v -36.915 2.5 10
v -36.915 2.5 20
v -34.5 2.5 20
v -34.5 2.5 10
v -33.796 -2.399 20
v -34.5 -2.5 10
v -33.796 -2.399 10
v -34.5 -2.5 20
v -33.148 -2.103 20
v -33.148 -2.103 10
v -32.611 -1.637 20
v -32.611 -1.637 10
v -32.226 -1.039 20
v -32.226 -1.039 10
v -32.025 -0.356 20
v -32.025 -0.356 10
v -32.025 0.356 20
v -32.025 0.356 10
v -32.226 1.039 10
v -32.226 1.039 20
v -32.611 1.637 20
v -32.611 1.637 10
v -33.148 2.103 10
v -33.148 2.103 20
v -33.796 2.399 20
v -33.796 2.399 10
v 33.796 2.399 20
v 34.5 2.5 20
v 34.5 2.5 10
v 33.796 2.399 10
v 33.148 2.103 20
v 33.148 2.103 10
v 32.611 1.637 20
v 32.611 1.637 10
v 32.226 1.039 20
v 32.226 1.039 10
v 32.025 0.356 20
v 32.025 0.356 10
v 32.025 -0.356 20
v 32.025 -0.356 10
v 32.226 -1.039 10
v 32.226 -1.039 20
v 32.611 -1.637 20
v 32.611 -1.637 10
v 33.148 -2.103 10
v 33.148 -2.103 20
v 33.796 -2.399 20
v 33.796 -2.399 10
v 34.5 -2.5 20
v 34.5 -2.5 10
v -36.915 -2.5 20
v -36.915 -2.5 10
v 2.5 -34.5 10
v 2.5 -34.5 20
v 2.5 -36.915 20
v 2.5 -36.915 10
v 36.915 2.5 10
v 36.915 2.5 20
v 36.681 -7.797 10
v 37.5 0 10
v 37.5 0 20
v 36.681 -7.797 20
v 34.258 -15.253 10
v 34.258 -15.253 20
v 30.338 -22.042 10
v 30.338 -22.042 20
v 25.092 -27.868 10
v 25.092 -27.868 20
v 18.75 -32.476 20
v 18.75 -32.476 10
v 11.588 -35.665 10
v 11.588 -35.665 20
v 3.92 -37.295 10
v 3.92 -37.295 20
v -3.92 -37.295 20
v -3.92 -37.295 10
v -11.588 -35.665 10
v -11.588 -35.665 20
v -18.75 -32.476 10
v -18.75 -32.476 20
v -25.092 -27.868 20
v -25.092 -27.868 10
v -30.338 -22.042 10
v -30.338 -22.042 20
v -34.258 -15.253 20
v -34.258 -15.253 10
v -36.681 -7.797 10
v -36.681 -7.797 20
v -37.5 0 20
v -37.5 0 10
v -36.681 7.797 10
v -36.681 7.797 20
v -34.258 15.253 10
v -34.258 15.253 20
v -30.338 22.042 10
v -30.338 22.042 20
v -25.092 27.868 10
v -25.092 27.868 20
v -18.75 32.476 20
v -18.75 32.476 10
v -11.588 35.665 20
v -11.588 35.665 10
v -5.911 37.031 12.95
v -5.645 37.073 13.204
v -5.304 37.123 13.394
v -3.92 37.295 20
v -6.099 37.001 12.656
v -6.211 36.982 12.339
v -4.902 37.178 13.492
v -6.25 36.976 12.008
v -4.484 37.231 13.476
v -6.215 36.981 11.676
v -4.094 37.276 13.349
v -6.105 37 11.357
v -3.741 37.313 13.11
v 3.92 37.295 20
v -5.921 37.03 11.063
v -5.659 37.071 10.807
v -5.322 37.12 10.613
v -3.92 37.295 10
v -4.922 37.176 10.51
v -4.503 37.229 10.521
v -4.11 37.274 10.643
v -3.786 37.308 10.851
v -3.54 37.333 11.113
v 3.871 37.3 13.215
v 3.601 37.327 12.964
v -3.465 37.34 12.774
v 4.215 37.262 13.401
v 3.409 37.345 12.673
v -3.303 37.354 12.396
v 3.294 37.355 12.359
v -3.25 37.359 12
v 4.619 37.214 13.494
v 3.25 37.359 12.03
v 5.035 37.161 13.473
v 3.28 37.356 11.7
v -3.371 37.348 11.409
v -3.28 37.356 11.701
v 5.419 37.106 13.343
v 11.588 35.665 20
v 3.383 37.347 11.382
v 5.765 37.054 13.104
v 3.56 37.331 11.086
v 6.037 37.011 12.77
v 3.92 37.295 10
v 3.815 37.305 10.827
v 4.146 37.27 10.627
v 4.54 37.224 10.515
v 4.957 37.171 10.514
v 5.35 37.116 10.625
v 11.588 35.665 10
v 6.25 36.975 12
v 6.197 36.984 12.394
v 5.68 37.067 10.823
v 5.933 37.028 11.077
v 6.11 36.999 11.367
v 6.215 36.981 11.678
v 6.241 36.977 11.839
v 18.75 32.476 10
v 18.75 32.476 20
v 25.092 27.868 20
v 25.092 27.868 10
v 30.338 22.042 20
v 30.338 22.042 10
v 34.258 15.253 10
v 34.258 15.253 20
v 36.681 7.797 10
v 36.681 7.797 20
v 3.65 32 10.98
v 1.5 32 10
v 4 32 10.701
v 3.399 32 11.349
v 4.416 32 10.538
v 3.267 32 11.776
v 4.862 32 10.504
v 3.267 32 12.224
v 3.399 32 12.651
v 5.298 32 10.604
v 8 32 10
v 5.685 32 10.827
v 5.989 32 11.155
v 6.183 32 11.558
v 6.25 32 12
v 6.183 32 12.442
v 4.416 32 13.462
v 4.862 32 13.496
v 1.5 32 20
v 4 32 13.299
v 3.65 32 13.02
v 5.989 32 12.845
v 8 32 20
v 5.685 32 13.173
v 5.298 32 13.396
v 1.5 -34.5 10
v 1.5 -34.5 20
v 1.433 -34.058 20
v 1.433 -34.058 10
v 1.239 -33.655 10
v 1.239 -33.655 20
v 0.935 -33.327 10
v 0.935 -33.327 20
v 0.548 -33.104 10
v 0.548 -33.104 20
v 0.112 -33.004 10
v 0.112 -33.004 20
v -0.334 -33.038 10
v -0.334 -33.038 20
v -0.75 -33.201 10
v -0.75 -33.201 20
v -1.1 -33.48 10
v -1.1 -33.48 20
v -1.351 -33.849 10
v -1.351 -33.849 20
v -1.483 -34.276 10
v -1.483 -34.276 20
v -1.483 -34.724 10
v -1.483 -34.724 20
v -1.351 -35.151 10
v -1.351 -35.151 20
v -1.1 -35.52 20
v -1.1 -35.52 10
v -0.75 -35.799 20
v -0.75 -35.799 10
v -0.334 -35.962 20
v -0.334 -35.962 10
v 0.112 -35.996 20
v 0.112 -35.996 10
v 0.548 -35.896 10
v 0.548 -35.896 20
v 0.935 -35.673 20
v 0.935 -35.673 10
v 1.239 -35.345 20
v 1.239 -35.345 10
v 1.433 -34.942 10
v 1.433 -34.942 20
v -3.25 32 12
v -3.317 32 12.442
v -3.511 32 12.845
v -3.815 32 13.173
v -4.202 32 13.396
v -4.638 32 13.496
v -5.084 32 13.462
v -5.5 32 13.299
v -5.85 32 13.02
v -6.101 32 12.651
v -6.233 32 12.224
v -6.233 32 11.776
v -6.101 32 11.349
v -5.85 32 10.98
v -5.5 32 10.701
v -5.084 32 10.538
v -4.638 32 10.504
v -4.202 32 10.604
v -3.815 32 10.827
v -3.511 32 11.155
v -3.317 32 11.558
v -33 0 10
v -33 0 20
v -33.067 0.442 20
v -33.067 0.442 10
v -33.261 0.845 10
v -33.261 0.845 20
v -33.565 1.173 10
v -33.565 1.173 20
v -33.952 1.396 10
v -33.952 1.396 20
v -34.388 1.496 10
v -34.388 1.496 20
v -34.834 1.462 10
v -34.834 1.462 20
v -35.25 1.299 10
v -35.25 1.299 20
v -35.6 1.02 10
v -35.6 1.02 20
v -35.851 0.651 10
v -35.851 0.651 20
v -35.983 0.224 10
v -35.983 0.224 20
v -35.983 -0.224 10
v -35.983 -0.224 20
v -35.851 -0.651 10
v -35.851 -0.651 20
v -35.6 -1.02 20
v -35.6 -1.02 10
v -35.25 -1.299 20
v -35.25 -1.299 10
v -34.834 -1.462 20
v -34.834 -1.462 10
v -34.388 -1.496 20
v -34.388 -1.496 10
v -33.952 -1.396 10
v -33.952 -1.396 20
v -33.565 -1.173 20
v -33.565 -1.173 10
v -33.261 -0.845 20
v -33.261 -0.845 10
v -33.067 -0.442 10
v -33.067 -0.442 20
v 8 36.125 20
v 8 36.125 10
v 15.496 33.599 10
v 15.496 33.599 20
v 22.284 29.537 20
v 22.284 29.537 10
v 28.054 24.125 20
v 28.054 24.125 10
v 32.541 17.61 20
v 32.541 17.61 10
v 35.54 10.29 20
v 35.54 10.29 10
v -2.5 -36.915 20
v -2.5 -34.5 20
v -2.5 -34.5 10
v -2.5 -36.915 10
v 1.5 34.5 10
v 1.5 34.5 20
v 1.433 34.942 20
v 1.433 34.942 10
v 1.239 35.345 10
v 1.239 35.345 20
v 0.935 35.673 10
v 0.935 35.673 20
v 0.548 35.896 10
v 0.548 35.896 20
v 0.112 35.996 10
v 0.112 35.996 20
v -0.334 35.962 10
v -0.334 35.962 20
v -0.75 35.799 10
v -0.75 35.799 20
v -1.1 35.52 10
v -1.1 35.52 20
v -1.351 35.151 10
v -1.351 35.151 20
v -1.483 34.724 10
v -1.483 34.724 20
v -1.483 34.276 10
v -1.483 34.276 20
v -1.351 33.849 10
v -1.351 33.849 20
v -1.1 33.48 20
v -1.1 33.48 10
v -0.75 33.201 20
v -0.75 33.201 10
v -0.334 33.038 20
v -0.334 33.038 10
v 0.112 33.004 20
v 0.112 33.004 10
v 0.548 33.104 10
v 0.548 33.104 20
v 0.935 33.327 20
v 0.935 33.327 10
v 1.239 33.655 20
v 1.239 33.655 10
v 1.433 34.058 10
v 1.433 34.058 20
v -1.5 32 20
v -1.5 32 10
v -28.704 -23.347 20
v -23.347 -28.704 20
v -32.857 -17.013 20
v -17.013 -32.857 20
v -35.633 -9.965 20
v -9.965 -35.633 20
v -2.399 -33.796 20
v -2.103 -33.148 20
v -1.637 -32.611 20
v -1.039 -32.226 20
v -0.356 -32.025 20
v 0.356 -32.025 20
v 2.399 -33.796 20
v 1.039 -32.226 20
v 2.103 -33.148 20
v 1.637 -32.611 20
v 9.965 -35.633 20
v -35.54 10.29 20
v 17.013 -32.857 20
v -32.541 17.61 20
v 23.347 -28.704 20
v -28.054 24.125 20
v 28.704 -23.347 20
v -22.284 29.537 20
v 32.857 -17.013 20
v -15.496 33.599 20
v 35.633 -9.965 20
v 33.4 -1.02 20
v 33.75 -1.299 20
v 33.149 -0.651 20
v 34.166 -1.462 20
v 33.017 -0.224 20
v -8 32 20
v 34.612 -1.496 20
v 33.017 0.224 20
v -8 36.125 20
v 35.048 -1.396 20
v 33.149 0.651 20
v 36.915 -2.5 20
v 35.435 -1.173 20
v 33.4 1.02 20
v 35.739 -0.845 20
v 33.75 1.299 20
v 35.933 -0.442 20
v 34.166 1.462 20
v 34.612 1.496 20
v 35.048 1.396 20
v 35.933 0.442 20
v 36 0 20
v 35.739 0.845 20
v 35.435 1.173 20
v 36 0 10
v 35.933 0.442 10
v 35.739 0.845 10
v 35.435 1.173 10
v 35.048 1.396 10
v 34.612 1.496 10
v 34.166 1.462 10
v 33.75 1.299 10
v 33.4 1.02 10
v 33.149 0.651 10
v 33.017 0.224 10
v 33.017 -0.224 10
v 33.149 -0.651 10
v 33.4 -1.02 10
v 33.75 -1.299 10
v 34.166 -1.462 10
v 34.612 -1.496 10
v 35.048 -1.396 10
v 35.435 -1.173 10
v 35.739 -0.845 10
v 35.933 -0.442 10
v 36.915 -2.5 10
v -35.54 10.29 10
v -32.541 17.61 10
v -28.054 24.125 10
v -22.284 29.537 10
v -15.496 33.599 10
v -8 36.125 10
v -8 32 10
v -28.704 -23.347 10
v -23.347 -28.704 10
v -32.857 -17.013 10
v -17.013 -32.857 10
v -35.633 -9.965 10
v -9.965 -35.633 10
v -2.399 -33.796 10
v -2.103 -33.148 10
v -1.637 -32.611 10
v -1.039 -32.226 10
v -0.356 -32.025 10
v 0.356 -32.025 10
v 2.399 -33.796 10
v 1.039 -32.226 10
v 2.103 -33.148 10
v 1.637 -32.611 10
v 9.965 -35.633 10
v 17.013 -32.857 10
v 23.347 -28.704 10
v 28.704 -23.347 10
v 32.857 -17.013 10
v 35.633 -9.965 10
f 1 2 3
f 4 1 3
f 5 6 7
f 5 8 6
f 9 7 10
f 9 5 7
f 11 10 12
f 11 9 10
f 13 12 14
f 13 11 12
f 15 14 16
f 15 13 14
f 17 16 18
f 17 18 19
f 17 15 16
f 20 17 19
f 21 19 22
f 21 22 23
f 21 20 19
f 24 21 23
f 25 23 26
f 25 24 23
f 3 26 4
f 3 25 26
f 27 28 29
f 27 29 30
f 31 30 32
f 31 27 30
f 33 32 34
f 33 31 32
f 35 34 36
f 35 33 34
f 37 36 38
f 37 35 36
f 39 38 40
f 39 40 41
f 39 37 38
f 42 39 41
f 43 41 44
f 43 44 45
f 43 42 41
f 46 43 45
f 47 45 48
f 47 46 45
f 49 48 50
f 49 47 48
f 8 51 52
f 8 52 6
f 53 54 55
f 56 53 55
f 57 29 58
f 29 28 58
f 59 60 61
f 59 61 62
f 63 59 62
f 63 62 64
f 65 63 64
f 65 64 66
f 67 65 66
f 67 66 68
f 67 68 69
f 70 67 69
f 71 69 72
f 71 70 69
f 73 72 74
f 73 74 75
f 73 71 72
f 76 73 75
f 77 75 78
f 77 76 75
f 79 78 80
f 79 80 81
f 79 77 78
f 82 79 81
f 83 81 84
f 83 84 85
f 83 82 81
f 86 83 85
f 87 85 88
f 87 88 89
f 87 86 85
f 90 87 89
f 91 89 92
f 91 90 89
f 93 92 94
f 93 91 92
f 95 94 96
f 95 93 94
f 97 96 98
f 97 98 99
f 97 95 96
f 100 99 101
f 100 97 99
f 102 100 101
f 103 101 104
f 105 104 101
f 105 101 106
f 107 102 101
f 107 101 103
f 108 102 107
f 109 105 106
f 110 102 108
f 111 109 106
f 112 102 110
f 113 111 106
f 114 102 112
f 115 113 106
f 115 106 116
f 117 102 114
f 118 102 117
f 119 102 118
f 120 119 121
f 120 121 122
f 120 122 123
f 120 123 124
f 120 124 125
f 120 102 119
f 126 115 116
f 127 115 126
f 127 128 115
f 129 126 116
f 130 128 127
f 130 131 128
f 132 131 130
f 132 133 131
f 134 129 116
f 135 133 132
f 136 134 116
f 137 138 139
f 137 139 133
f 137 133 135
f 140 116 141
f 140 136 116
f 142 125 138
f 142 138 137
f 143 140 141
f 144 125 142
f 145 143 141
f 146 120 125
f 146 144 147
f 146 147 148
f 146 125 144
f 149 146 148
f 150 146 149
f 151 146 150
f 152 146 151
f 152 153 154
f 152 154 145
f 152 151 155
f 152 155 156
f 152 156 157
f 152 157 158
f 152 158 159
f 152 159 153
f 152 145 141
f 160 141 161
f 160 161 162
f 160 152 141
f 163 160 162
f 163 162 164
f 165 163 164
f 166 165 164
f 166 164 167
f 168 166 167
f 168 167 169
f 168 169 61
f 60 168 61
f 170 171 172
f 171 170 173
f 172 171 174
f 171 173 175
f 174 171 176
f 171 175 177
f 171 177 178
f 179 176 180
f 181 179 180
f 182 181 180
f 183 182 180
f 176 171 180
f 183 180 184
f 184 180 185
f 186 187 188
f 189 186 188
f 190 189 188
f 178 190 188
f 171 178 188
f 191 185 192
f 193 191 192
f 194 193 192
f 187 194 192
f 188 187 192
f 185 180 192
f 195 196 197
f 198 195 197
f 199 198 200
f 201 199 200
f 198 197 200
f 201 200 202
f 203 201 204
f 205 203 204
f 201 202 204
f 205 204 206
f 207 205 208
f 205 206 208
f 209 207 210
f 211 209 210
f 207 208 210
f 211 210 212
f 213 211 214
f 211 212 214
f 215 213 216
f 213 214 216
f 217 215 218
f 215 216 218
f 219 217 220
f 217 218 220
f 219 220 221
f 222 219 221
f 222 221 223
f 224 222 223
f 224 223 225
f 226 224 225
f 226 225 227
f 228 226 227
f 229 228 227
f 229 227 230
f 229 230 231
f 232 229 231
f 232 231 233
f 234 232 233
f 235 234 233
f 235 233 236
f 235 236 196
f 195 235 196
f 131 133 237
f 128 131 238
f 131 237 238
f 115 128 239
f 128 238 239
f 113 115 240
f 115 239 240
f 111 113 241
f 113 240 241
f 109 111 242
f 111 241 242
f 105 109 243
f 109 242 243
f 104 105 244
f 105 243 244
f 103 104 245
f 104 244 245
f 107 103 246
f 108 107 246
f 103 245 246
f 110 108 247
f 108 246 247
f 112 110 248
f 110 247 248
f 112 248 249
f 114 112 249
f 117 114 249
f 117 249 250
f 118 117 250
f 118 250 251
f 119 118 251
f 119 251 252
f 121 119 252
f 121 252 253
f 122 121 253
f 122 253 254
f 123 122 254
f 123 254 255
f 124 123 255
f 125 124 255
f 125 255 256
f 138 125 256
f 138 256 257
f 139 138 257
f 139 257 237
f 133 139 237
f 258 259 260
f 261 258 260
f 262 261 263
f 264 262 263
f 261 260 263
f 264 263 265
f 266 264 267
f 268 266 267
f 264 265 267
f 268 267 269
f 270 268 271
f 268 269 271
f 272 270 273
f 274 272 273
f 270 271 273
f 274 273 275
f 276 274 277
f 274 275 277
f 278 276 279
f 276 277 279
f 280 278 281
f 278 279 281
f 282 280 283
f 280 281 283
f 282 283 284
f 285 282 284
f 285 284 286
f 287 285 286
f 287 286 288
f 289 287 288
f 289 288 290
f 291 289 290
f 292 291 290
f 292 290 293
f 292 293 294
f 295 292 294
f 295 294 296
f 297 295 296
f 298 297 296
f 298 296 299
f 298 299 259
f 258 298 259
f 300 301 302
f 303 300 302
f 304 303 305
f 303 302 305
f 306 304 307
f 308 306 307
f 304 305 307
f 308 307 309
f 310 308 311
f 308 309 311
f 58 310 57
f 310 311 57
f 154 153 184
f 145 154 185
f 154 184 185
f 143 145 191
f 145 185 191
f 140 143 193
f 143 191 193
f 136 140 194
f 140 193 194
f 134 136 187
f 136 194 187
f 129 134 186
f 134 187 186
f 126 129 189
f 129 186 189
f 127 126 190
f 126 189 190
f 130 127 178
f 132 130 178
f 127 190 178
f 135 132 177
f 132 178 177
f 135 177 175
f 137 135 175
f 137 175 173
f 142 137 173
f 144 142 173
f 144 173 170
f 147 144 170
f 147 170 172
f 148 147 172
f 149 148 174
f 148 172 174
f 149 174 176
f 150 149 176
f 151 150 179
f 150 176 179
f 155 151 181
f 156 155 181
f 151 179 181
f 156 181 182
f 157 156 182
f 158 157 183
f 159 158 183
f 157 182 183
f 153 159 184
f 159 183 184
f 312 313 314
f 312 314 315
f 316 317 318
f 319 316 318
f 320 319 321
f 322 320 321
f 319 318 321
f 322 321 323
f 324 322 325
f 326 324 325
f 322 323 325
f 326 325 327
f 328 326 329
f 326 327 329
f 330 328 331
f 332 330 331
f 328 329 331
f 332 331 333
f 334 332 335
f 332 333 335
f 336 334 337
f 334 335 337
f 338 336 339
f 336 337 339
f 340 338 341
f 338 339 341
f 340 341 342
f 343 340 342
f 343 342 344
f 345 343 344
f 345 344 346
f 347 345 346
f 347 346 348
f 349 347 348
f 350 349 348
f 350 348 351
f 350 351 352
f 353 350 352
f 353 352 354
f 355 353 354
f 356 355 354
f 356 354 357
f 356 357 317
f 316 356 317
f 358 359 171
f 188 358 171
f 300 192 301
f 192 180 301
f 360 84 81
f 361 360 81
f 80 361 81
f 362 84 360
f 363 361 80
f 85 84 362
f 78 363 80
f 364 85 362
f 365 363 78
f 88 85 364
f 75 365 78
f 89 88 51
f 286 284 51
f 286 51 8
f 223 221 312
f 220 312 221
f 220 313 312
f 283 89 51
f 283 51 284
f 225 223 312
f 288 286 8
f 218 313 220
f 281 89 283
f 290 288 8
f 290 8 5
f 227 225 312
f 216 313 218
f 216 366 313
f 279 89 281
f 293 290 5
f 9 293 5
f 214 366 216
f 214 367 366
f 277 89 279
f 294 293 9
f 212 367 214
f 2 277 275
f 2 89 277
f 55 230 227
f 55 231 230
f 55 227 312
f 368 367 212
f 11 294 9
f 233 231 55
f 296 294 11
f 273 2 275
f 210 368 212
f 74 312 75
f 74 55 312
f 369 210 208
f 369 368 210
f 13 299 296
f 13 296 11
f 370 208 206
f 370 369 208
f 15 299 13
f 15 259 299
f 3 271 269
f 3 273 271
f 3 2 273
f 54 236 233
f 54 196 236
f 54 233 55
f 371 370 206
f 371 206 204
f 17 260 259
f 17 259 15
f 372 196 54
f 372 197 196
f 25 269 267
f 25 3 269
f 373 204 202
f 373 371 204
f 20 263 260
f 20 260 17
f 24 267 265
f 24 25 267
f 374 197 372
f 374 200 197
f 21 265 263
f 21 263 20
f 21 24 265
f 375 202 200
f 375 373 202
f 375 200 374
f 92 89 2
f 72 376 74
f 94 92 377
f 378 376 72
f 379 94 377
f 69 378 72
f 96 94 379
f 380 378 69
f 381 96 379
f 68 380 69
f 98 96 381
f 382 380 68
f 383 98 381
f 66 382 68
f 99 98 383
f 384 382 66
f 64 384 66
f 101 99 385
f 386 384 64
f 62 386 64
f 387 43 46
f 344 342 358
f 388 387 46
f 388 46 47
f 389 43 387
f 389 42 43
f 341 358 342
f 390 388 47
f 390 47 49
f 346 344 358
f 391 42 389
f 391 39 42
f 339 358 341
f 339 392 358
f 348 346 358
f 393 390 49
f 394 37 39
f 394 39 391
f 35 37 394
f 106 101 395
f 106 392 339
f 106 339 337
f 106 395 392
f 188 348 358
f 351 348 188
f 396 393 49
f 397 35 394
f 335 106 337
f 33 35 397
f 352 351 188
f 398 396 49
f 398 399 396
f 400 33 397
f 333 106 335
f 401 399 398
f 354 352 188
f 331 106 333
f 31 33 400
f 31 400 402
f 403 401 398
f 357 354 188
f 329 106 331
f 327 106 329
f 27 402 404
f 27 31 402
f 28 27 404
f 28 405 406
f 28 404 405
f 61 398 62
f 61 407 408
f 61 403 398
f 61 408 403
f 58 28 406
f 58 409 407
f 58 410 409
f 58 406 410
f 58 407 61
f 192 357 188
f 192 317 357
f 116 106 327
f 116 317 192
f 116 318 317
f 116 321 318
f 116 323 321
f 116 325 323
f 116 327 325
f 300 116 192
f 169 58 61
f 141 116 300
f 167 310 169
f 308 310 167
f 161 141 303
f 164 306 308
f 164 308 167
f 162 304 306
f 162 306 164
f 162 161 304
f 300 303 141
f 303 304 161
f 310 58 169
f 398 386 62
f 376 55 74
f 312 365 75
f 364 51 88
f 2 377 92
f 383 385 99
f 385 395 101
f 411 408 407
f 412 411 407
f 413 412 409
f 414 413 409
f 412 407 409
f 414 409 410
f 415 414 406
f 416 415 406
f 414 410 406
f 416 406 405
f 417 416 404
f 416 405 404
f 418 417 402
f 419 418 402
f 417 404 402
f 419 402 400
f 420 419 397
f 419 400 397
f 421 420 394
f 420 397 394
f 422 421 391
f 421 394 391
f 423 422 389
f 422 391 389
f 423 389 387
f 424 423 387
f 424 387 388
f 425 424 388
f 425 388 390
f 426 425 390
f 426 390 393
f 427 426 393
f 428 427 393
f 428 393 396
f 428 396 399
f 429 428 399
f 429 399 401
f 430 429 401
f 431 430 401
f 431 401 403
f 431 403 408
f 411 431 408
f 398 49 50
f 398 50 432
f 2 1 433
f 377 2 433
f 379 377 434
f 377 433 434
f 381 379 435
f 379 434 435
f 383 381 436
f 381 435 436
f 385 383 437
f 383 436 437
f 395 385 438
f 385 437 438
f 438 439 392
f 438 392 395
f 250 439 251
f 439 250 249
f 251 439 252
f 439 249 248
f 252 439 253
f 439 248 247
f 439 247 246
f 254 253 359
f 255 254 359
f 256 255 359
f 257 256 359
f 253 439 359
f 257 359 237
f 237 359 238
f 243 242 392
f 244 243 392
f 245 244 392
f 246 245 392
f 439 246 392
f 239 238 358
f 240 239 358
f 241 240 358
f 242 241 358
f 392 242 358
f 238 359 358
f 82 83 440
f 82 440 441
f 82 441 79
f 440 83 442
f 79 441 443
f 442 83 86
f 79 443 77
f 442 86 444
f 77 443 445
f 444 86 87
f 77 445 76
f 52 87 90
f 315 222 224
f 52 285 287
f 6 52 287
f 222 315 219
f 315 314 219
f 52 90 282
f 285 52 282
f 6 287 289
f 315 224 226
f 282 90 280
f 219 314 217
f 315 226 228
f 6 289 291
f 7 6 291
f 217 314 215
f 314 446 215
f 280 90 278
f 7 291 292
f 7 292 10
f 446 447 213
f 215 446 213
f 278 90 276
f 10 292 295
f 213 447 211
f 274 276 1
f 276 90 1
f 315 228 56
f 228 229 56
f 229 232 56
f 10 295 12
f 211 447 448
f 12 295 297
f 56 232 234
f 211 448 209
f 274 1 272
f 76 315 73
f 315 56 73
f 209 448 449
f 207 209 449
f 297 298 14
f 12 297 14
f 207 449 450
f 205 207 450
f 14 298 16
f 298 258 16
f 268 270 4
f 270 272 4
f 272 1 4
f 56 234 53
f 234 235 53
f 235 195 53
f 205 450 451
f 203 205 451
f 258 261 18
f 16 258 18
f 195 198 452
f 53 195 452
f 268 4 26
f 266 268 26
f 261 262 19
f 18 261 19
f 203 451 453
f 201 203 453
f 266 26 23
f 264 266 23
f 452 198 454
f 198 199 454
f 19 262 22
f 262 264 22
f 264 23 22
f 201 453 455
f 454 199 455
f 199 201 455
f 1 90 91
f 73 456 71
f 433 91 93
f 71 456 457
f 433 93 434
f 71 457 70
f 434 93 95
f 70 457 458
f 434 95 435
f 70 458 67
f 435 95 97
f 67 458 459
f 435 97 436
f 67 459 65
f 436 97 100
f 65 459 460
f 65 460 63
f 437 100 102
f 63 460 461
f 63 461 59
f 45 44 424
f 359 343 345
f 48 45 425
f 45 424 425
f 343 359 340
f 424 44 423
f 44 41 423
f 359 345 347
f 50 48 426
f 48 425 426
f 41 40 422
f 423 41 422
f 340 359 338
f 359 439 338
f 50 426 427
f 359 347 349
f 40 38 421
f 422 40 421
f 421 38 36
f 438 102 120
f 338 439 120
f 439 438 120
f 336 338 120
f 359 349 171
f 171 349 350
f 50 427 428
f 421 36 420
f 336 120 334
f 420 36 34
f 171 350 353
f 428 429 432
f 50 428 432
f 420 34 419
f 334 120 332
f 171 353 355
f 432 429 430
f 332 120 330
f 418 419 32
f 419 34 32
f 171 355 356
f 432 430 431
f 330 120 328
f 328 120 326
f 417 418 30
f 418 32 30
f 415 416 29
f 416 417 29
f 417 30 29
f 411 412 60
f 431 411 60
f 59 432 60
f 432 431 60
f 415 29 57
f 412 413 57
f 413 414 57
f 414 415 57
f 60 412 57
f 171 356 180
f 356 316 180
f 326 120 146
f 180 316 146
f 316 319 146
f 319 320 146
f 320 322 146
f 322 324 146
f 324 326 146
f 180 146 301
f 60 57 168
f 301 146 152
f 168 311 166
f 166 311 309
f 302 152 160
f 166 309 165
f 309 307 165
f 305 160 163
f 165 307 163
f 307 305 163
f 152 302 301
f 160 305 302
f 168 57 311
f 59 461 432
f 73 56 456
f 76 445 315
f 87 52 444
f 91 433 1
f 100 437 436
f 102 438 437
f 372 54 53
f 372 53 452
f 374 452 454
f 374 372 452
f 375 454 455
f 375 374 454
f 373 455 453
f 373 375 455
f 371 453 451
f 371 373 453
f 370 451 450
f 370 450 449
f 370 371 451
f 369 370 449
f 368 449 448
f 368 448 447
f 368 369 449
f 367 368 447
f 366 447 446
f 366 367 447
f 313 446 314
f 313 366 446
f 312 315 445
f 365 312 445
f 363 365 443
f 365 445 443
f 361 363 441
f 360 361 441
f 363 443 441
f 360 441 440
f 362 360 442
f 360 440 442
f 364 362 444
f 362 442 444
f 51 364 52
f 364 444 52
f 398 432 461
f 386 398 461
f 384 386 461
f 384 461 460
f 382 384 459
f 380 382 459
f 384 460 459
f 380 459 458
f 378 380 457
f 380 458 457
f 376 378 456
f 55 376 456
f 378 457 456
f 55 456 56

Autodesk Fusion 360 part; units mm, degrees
sketch "Esboço2" plane through (0, 0, 0) normal (0, 0, 1) x (1, 0, 0)
  circle A0 centre (0, 0) radius 37.5
  circle A1 centre (0, 0) radius 37
  dimension "d6" = 75
  dimension "d7" = 74
extrude "Extrusão2" add sketch "Esboço2" along normal blind 190
ref_plane "Plano de trabalho9" through (0, 0, 187) normal (0, 0, 1) x (1, 0, 0)
sketch "Esboço10" plane through (0, 0, 187) normal (0, 0, 1) x (1, 0, 0)
  circle A0 centre (0, 0) radius 34.5 construction
  line L0 (0, 0) -> (-68.1762, 0) construction
  line L1 (0, 0) -> (60, 0) construction
  line L2 (0, 0) -> (0, 45) construction
  line L3 (0, 0) -> (0, -43.1659) construction
  circle A1 centre (34.5, 0) radius 1.5
  line L4 (3, -43) -> (3, -42)
  circle A2 centre (0, 34.5) radius 1.5
  circle A3 centre (-34.5, 0) radius 1.5
  circle A4 centre (0, -34.5) radius 1.5
  arc A5 (34.5, 2.5) -> (34.5, -2.5) centre (34.5, 0) ccw
  arc A6 (-2.5, 34.5) -> (2.5, 34.5) centre (0, 34.5) ccw
  arc A7 (-34.5, -2.5) -> (-34.5, 2.5) centre (-34.5, 0) ccw
  arc A8 (2.5, -34.5) -> (-2.5, -34.5) centre (0, -34.5) ccw
  circle A9 centre (0, 0) radius 37
  line L5 (-36.9154, 2.5) -> (-34.4093, 2.5)
  line L6 (-36.9154, -2.5) -> (-34.4093, -2.5)
  line L7 (34.5, 2.5) -> (36.9154, 2.5)
  line L8 (34.5, -2.5) -> (36.9154, -2.5)
  line L9 (2.5, 36.9154) -> (2.5, 34.4093)
  line L10 (-2.5, 36.9154) -> (-2.5, 34.4093)
  line L11 (-2.5, -34.4093) -> (-2.5, -36.9154)
  line L12 (2.5, -34.4093) -> (2.5, -36.9154)
  dimension "d82" = 69
  dimension "d83" = 3
  dimension "d84" = 2.5
  dimension "d85" = 2.5
  dimension "d87" = 360
  dimension "d89" = 360
  dimension "d90" = 2.5
extrude "Extrusão12" add sketch "Esboço10" against normal blind 184 contours A5 A9 L7 L8 | A6 A9 L9 L10 | A8 A9 L11 L12 | A7 A9 L5 L6
thread "Rosca3"
ref_plane "Plano de trabalho3" through (0, 0, 32) normal (0, 0, 1) x (1, 0, 0)
sketch "Esboço3" plane through (0, 0, 32) normal (0, 0, 1) x (1, 0, 0)
  line L0 (0, 0) -> (0, 37) construction
  line L1 (34.2491, 14) -> (-34.2491, 14)
  circle A0 centre (0, 0) radius 37
  line L2 (31.1288, 20) -> (-31.1288, 20)
  line L3 (32.8634, 17) -> (-32.8634, 17)
  circle A1 centre (0, 0) radius 50
  circle A2 centre (0, 0) radius 37.5
  line L4 (-8, 0) -> (8, 0)
  line L5 (8, 0) -> (8, 36.1248)
  line L6 (-8, 0) -> (-8, 36.1248)
  circle A3 centre (0, 34.5) radius 1.5
  line L7 (1.5, 32.5) -> (1.5, 0)
  arc A4 (-2.5, 34.5) -> (2.5, 34.5) centre (0, 34.5) ccw
  line L8 (-1.5, 32.5) -> (-1.5, 0)
  line L9 (27.8634, 24.3441) -> (27.8634, 11)
  line L10 (27.8634, 11) -> (35.327, 11)
  line L11 (-27.8634, 11) -> (-35.327, 11)
  line L12 (-27.8634, 24.3441) -> (-27.8634, 11)
  line L13 (-30.4631, 21) -> (30.4631, 21)
  line L14 (-34.641, 13) -> (34.641, 13)
  line L15 (0, 32) -> (8, 32)
  line L16 (0, 32) -> (-8, 32)
  dimension "d12" = 6
  dimension "d15" = 3
  dimension "d17" = 75
  dimension "d18" = 100
  dimension "d41" = 14
  dimension "d51" = 8
  dimension "d52" = 16
  dimension "d99" = 3
  dimension "d100" = 2.5
  dimension "d115" = 6.5
  dimension "d123" = 5
  dimension "d124" = 6
  dimension "d143" = 4
  dimension "d144" = 4
extrude "Extrusão21" add sketch "Esboço3" along normal blind 6 and the other way blind 6 contours L1 A0 L9 L14 | L1 A0 L3 L9 | A0 L9 L10 L14 | A0 L2 L3 L9 | A0 L2 L9 L13 | A0 L9 L13 | A0 L11 L12 L14 | L1 A0 L12 L14 | L1 A0 L3 L12 | A0 L2 L3 L12 | A0 L12 L13 | A0 L2 L12 L13
sketch "Esboço18" plane through (-27.8634, 0, 0) normal (1, 0, 0) x (0, 1, 0)
  line L0 (24.3441, 26) -> (24.3441, 38)
  line L1 (24.3441, 38) -> (11, 38)
  line L2 (11, 38) -> (11, 26)
  line L3 (11, 26) -> (24.3441, 26)
  circle A0 centre (17, 32) radius 4
  point P0 (11, 32)
  dimension "d166" = 8
  dimension "d167" = 6
  dimension "d168" = 6
ref_plane "Plano de trabalho11" through (0, 0, 0) normal (1, 0, 0) x (0, 1, 0)
extrude "Extrusão23" cut sketch "Esboço18" against normal blind 15 contours A0
extrude "Extrusão7" add sketch "Esboço3" along normal blind 30 and the other way blind 30 contours L1 L5 L7 L14 | L1 L3 L5 L7 | L4 L5 L7 L14 | L2 L3 L5 L7 | L1 L6 L8 L14 | L1 L3 L6 L8 | L2 L5 L7 L13 | L2 L3 L6 L8 | L4 L6 L8 L14 | L5 L7 L13 L15 | A0 L5 L6 L7 A4 L8 L15 L16 | L2 L6 L8 L13 | L6 L8 L13 L16 | L7 A4 L15 | A4 L8 L16
sketch "Esboço19" plane through (27.8634, 0, 0) normal (-1, 0, 0) x (0, -1, 0)
  line L0 (-11, 26) -> (-11, 38)
  line L1 (-11, 38) -> (-24.3441, 38)
  line L2 (-24.3441, 38) -> (-24.3441, 26)
  line L3 (-24.3441, 26) -> (-11, 26)
extrude "Extrusão24" cut sketch "Esboço18" along normal blind 80 contours A0
sketch "Esboço11" plane through (8, 0, 0) normal (1, 0, 0) x (0, 1, 0)
  line L0 (0, 2) -> (36.1248, 2)
  line L1 (36.1248, 2) -> (36.1248, 62)
  line L2 (36.1248, 62) -> (0, 62)
  line L3 (0, 62) -> (0, 2)
  circle A0 centre (17, 32) radius 3
  circle A1 centre (17, 32) radius 9.5
  circle A2 centre (17, 32) radius 12.5
  line L4 (36.1248, 32) -> (36.1248, -5) construction
  line L5 (0, 32) -> (36.1248, 32)
  line L6 (30.1248, 2) -> (8.3278, 22.9976)
  line L7 (30.1248, 62) -> (8.3278, 41.0024)
  line L8 (30.1248, 2) -> (31.9998, 2)
  line L9 (31.9998, 2) -> (31.9998, 32)
  line L10 (30.1248, 62) -> (31.9998, 62)
  line L11 (31.9998, 62) -> (31.9998, 32)
  circle A3 centre (17, 32) radius 4
  point P0 (14, 32)
  point P1 (20, 32)
  dimension "d106" = 6
  dimension "d107" = 19
  dimension "d109" = 25
  dimension "d110" = 6
  dimension "d147" = 1.875
extrude "Extrusão13" cut sketch "Esboço11" against normal blind 16 contours L0 L3 A2 L5 L6 | L0 A2 L5 L6 L8 L9 | L2 L3 A2 L5 L7 | A1 A2 L5 | A1 A2 L5 | L2 A2 L5 L7 L10 L11 | A1 L5 A3 | A1 L5 A3 | A0 L5 A3 | A0 L5 A3 | A0 L5 | A0 L5
ref_plane "Plano de trabalho4" through (0, 0, 150) normal (0, 0, 1) x (1, 0, 0)
sketch "Esboço4" plane through (0, 0, 150) normal (0, 0, 1) x (1, 0, 0)
  circle A0 centre (0, 0) radius 37
  circle A1 centre (0, 0) radius 50
  circle A2 centre (0, 0) radius 37.5
  line L0 (-20, -31.1288) -> (-20, 31.1288)
  line L1 (-17, -32.8634) -> (-17, 32.8634)
  line L2 (-14, -34.2491) -> (-14, 34.2491)
  line L3 (0, 8) -> (0, -8)
  line L4 (0, 8) -> (-36.1248, 8)
  line L5 (0, -8) -> (-36.1248, -8)
  line L6 (0, 0) -> (-37, 0) construction
  circle A3 centre (-34.5, 0) radius 1.5
  line L7 (0, 1.5) -> (-32.5, 1.5)
  arc A4 (-34.5, -2.5) -> (-34.5, 2.5) centre (-34.5, 0) ccw
  line L8 (0, -1.5) -> (-32.5, -1.5)
  line L9 (-24.3441, -27.8634) -> (-11, -27.8634)
  line L10 (-11, -27.8634) -> (-11, -35.327)
  line L11 (-24.3441, 27.8634) -> (-11, 27.8634)
  line L12 (-11, 27.8634) -> (-11, 35.327)
  line L13 (-13, 34.641) -> (-13, -34.641)
  line L14 (-21, 30.4631) -> (-21, -30.4631)
  line L15 (-32, 0) -> (-32, 8)
  line L16 (-32, 0) -> (-32, -8)
  dimension "d28" = 75
  dimension "d29" = 100
  dimension "d38" = 14
  dimension "d39" = 6
  dimension "d40" = 3
  dimension "d43" = 16
  dimension "d44" = 8
  dimension "d101" = 3
  dimension "d102" = 2.5
  dimension "d116" = 6.5
  dimension "d135" = 6
  dimension "d136" = 5
  dimension "d145" = 4
  dimension "d146" = 4
extrude "Extrusão25" add sketch "Esboço4" along normal blind 6 and the other way blind 6 contours A0 L11 L12 L13 | A0 L9 L10 L13 | A0 L2 L11 L13 | A0 L2 L9 L13 | A0 L1 L2 L11 | A0 L1 L2 L9 | A0 L0 L1 L11 | A0 L0 L1 L9 | A0 L0 L11 L14 | A0 L0 L9 L14 | A0 L11 L14 | A0 L9 L14
sketch "Esboço20" plane through (0, 27.8634, 0) normal (0, -1, 0) x (1, 0, 0)
  line L0 (-11, 144) -> (-11, 156)
  line L1 (-11, 156) -> (-24.3441, 156)
  line L2 (-24.3441, 156) -> (-24.3441, 144)
  line L3 (-24.3441, 144) -> (-11, 144)
  circle A0 centre (-17, 150) radius 4
  dimension "d179" = 8
  dimension "d180" = 6
  dimension "d182" = 6
extrude "Extrusão26" cut sketch "Esboço20" against normal blind 15 contours A0
sketch "Esboço21" plane through (0, -27.8634, 0) normal (0, 1, 0) x (-1, 0, 0)
  line L0 (24.3441, 144) -> (24.3441, 156)
  line L1 (24.3441, 156) -> (11, 156)
  line L2 (11, 156) -> (11, 144)
  line L3 (11, 144) -> (24.3441, 144)
  circle A0 centre (17, 150) radius 4
  dimension "d185" = 8
  dimension "d186" = 6
  dimension "d187" = 6
extrude "Extrusão27" cut sketch "Esboço21" against normal blind 15 contours A0
extrude "Extrusão6" add sketch "Esboço4" along normal blind 30 and the other way blind 30 contours L2 L4 L7 L13 | L3 L4 L7 L13 | L3 L5 L8 L13 | L2 L5 L8 L13 | L1 L2 L4 L7 | L1 L2 L5 L8 | L0 L1 L4 L7 | L0 L1 L5 L8 | L0 L4 L7 L14 | L0 L5 L8 L14 | A0 L4 L5 L7 A4 L8 L15 L16 | L4 L7 L14 L15 | L5 L8 L14 L16 | L7 A4 L15 | A4 L8 L16
sketch "Esboço13" plane through (0, -8, 0) normal (0, -1, 0) x (1, 0, 0)
  line L0 (0, 120) -> (0, 180)
  line L1 (0, 180) -> (-36.1248, 180)
  line L2 (-36.1248, 180) -> (-36.1248, 120)
  line L3 (-36.1248, 120) -> (0, 120)
  circle A0 centre (-17, 150) radius 3
  circle A1 centre (-17, 150) radius 9.5
  circle A2 centre (-17, 150) radius 12.5
  line L4 (-36.1248, 150) -> (-36.1248, 198.4836) construction
  line L5 (-30.1248, 180) -> (-6.6704, 157.4058)
  line L6 (0, 150) -> (-36.1248, 150)
  line L7 (-30.1248, 120) -> (-6.6704, 142.5942)
  line L8 (-30.1248, 180) -> (-31.9998, 180)
  line L9 (-31.9998, 180) -> (-31.9998, 150)
  line L10 (-30.1248, 120) -> (-31.9998, 120)
  line L11 (-31.9998, 120) -> (-31.9998, 150)
  point P0 (-14, 150)
  point P1 (-20, 150)
  dimension "d117" = 6
  dimension "d118" = 19
  dimension "d119" = 25
  dimension "d120" = 6
  dimension "d148" = 1.875
extrude "Extrusão14" cut sketch "Esboço13" against normal blind 16 contours L0 L3 A2 L6 L7 | L0 L1 A2 L5 L6 | L3 A2 L6 L7 L10 L11 | A1 A2 L6 | A1 A2 L6 | L1 A2 L5 L6 L8 L9 | A0 A1 L6 | A0 A1 L6 | A0 L6 | A0 L6
ref_plane "Plano de trabalho5" through (0, 0, 0) normal (1, 0, 0) x (0, 1, 0)
ref_plane "Plano de trabalho6" through (0, 0, 0) normal (0, 1, 0) x (0, 0, 1)
ref_plane "Plano de trabalho7" through (0, 0, 134.3) normal (0, 0, 1) x (1, 0, 0)
sketch "Esboço8" plane through (0, 0, 134.3) normal (0, 0, 1) x (1, 0, 0)
  line L0 (46.3444, 0) -> (0, 0) construction
  line L1 (8, 36.1248) -> (8, -36.1248)
  line L2 (-8, -36.1248) -> (-8, 36.1248)
  circle A0 centre (0, 0) radius 37
  line L3 (0, 0) -> (0, 37) construction
  circle A1 centre (0, 34.5) radius 1.5
  circle A2 centre (0, -34.5) radius 1.5
  dimension "d72" = 8
  dimension "d73" = 8
  dimension "d95" = 2.5
  dimension "d96" = 3
extrude "Extrusão10" add sketch "Esboço8" along normal blind 2 contours L1 L2 A0
ref_plane "Plano de trabalho8" through (0, 0, 45.7) normal (0, 0, 1) x (1, 0, 0)
sketch "Esboço9" plane through (0, 0, 45.7) normal (0, 0, 1) x (1, 0, 0)
  line L0 (0, 0) -> (-37, 0) construction
  line L1 (-36.1248, 8) -> (36.1248, 8)
  line L2 (-36.1248, -8) -> (36.1248, -8)
  circle A0 centre (0, 0) radius 37
  circle A1 centre (-34.5, 0) radius 1.5
  line L3 (0, 0) -> (0, 43.2459) construction
  circle A2 centre (34.5, 0) radius 1.5
  dimension "d77" = 8
  dimension "d78" = 8
  dimension "d97" = 3
  dimension "d98" = 2.5
extrude "Extrusão11" add sketch "Esboço9" along normal blind 2 contours L1 L2 A0
ref_plane "Plano de trabalho10" through (8, 18.0624, 32) normal (1, 0, 0) x (0, 1, 0)
sketch "Esboço16" plane through (-31.9998, 0, 0) normal (1, 0, 0) x (0, 1, 0)
  line L0 (1.5, 180) -> (1.5, 120)
  line L1 (1.5, 120) -> (8, 120)
  line L2 (8, 120) -> (8, 180)
  line L3 (8, 180) -> (1.5, 180)
  line L4 (4.75, 180) -> (4.75, 120) construction
  circle A0 centre (4.75, 170) radius 1.5
  circle A1 centre (4.75, 130) radius 1.5
  line L5 (8, 150) -> (-12.335, 150) construction
  line L6 (0, 2.5) -> (0, 20)
  circle A2 centre (-4.75, 170) radius 1.5
  circle A3 centre (-4.75, 130) radius 1.5
  dimension "d149" = 3
  dimension "d150" = 3
  dimension "d151" = 40
  dimension "d152" = 20
extrude "Extrusão19" cut sketch "Esboço16" against normal blind 10 contours A0 | A1 | A2 | A3
sketch "Esboço17" plane through (0, 31.9998, 0) normal (0, -1, 0) x (1, 0, 0)
  line L0 (1.5, 62) -> (1.5, 2)
  line L1 (1.5, 2) -> (8, 2)
  line L2 (8, 2) -> (8, 62)
  line L3 (8, 62) -> (1.5, 62)
  line L4 (4.75, 2) -> (4.75, 62) construction
  line L5 (8, 32) -> (-12, 32) construction
  circle A0 centre (4.75, 52) radius 1.5
  circle A1 centre (4.75, 12) radius 1.5
  line L6 (0, 1.75) -> (0, 22.5)
  circle A2 centre (-4.75, 12) radius 1.5
  circle A3 centre (-4.75, 52) radius 1.5
  dimension "d155" = 3
  dimension "d156" = 3
  dimension "d157" = 40
  dimension "d158" = 20
extrude "Extrusão20" cut sketch "Esboço17" against normal blind 10 contours A0 | A1 | A2 | A3
thread "Rosca4"
thread "Rosca5"
sketch "Esboço22" plane through (0, 0, 136.3) normal (0, 0, 1) x (-1, 0, 0)
  line L0 (2.5, 36.9154) -> (2.5, 34.5)
  arc A0 (-2.5, 34.5) -> (2.5, 34.5) centre (0, 34.5) ccw
  line L1 (-2.5, 34.5) -> (-2.5, 36.9154)
  arc A1 (-2.5, 36.9154) -> (-8, 36.1248) centre (0, 0) ccw
  line L2 (-8, 36.1248) -> (-8, -36.1248)
  arc A2 (-8, -36.1248) -> (-2.5, -36.9154) centre (0, 0) ccw
  line L3 (-2.5, -36.9154) -> (-2.5, -34.5)
  arc A3 (2.5, -34.5) -> (-2.5, -34.5) centre (0, -34.5) ccw
  line L4 (2.5, -34.5) -> (2.5, -36.9154)
  arc A4 (2.5, -36.9154) -> (8, -36.1248) centre (0, 0) ccw
  line L5 (8, -36.1248) -> (8, 36.1248)
  arc A5 (8, 36.1248) -> (2.5, 36.9154) centre (0, 0) ccw
  line L6 (0, 0) -> (-21, 0) construction
  line L7 (0, 0) -> (0, -18) construction
  line L8 (2, -14.5) -> (-2, -14.5)
  arc A6 (-2, -14.5) -> (-2, -21.5) centre (-2, -18) ccw
  line L9 (-2, -21.5) -> (2, -21.5)
  arc A7 (2, -21.5) -> (2, -14.5) centre (2, -18) ccw
  line L10 (2, -18) -> (-2, -18) construction
  arc A8 (-2, 21.5) -> (-2, 14.5) centre (-2, 18) ccw
  line L11 (2, 14.5) -> (-2, 14.5)
  arc A9 (2, 14.5) -> (2, 21.5) centre (2, 18) ccw
  line L12 (-2, 21.5) -> (2, 21.5)
  circle A10 centre (0, 9.5) radius 1.5
  line L13 (2, 18) -> (-2, 18) construction
  circle A11 centre (0, 26.5) radius 1.5
  circle A12 centre (0, -9.5) radius 1.5
  circle A13 centre (0, -26.5) radius 1.5
  point P0 (0, -18)
  dimension "d191" = 18
  dimension "d195" = 2
  dimension "d196" = 3.5
  dimension "d204" = 3
  dimension "d205" = 8.5
extrude "Extrusão28" cut sketch "Esboço22" against normal blind 5 contours L8 A6 L9 A7 | A8 L11 A9 L12 | A10 | A11 | A12 | A13
sketch "Esboço23" plane through (0, 0, 45.7) normal (0, 0, -1) x (1, 0, 0)
  line L0 (36.9154, -2.5) -> (34.5, -2.5)
  arc A0 (34.5, 2.5) -> (34.5, -2.5) centre (34.5, 0) ccw
  line L1 (34.5, 2.5) -> (36.9154, 2.5)
  arc A1 (36.9154, 2.5) -> (36.1248, 8) centre (0, 0) ccw
  line L2 (36.1248, 8) -> (-36.1248, 8)
  arc A2 (-36.1248, 8) -> (-36.9154, 2.5) centre (0, 0) ccw
  line L3 (-36.9154, 2.5) -> (-34.5, 2.5)
  arc A3 (-34.5, -2.5) -> (-34.5, 2.5) centre (-34.5, 0) ccw
  line L4 (-34.5, -2.5) -> (-36.9154, -2.5)
  arc A4 (-36.9154, -2.5) -> (-36.1248, -8) centre (0, 0) ccw
  line L5 (-36.1248, -8) -> (36.1248, -8)
  arc A5 (36.1248, -8) -> (36.9154, -2.5) centre (0, 0) ccw
  line L6 (0, 0) -> (0, -19) construction
  line L7 (0, 0) -> (18, 0)
  line L8 (14.5, 2.5) -> (14.5, -2.5)
  arc A6 (14.5, -2.5) -> (21.5, -2.5) centre (18, -2.5) ccw
  line L9 (21.5, -2.5) -> (21.5, 2.5)
  arc A7 (21.5, 2.5) -> (14.5, 2.5) centre (18, 2.5) ccw
  line L10 (18, 2.5) -> (18, -2.5) construction
  line L11 (-14.5, 2.5) -> (-14.5, -2.5)
  arc A8 (-14.5, 2.5) -> (-21.5, 2.5) centre (-18, 2.5) ccw
  line L12 (-21.5, -2.5) -> (-21.5, 2.5)
  arc A9 (-21.5, -2.5) -> (-14.5, -2.5) centre (-18, -2.5) ccw
  circle A10 centre (9.5, 0) radius 1.5
  circle A11 centre (26.5, 0) radius 1.5
  circle A12 centre (-9.5, 0) radius 1.5
  circle A13 centre (-26.5, 0) radius 1.5
  point P0 (18, 0)
  dimension "d199" = 3.5
  dimension "d200" = 5
  dimension "d201" = 18
  dimension "d206" = 3
  dimension "d207" = 8.5
extrude "Extrusão29" cut sketch "Esboço23" against normal blind 10 contours L7 A10 | L8 A6 L9 A7 | L7 A10 | L11 A8 L12 A9 | A11 | A12 | A13
ref_plane "Plano de trabalho12" through (0, 0, 106.3) normal (0, 0, 1) x (1, 0, 0)
sketch "Esboço24" plane through (0, 0, 106.3) normal (0, 0, 1) x (1, 0, 0)
  line L0 (0, 0) -> (28.1868, 0) construction
  line L1 (16, 0) -> (16, 33.3617)
  circle A0 centre (0, 0) radius 37
  line L2 (16, 0) -> (16, -33.3617)
  line L3 (0, 0) -> (0, 19.3) construction
  line L4 (-16, 0) -> (-16, 33.3617)
  line L5 (-16, 0) -> (-16, -33.3617)
  line L6 (-2, 6.8) -> (2, 6.8)
  arc A1 (2, 6.8) -> (2, 31.8) centre (2, 19.3) ccw
  line L7 (2, 31.8) -> (-2, 31.8)
  arc A2 (-2, 31.8) -> (-2, 6.8) centre (-2, 19.3) ccw
  line L8 (-2, 19.3) -> (2, 19.3) construction
  arc A3 (2, -31.8) -> (2, -6.8) centre (2, -19.3) ccw
  arc A4 (-2, -6.8) -> (-2, -31.8) centre (-2, -19.3) ccw
  line L9 (-2, -6.8) -> (2, -6.8)
  line L10 (2, -31.8) -> (-2, -31.8)
  circle A5 centre (0, 34.5) radius 1.5
  circle A6 centre (0, -34.5) radius 1.5
  point P0 (0, 19.3)
  dimension "d209" = 16
  dimension "d210" = 12.5
  dimension "d211" = 4
  dimension "d212" = 19.3
  dimension "d215" = 3
  dimension "d216" = 34.5
ref_plane "Plano de trabalho13" through (0, 0, 55.7) normal (0, 0, -1) x (-1, 0, 0)
ref_plane "Plano de trabalho14" through (0, 0, 60) normal (0, 0, 1) x (1, 0, 0)
sketch "Esboço25" plane through (0, 0, 55.7) normal (0, 0, -1) x (1, 0, 0)
  line L0 (-33.3617, 16) -> (33.3617, 16)
  circle A0 centre (0, 0) radius 37
  line L1 (0, 0) -> (-19.3, 0) construction
  line L2 (-33.3617, -16) -> (33.3617, -16)
  line L3 (-6.8, -2) -> (-6.8, 2)
  arc A1 (-6.8, 2) -> (-31.8, 2) centre (-19.3, 2) ccw
  line L4 (-31.8, 2) -> (-31.8, -2)
  arc A2 (-31.8, -2) -> (-6.8, -2) centre (-19.3, -2) ccw
  line L5 (-19.3, -2) -> (-19.3, 2) construction
  circle A3 centre (-34.5, 0) radius 1.5
  line L6 (0, 0) -> (0, -12) construction
  arc A4 (31.8, 2) -> (6.8, 2) centre (19.3, 2) ccw
  line L7 (6.8, -2) -> (6.8, 2)
  arc A5 (6.8, -2) -> (31.8, -2) centre (19.3, -2) ccw
  circle A6 centre (34.5, 0) radius 1.5
  line L8 (31.8, 2) -> (31.8, -2)
  point P0 (-19.3, 0)
  dimension "d219" = 16
  dimension "d220" = 12.5
  dimension "d221" = 4
  dimension "d222" = 19.3
  dimension "d224" = 34.5
  dimension "d225" = 3
ref_plane "Plano de trabalho15" through (0, 0, 10) normal (0, 0, 1) x (1, 0, 0)
ref_plane "Plano de trabalho16" through (0, 0, 20) normal (0, 0, 1) x (1, 0, 0)
sketch "Esboço26" plane through (0, 0, 20) normal (0, 0, 1) x (1, 0, 0)
  circle A0 centre (0, 0) radius 46.1575
extrude "Extrusão32" cut sketch "Esboço26" along normal blind 200
sketch "Esboço27" plane through (0, 0, 10) normal (0, 0, 1) x (1, 0, 0)
  circle A0 centre (0, 0) radius 46.2512
extrude "Extrusão33" cut sketch "Esboço27" against normal blind 100
